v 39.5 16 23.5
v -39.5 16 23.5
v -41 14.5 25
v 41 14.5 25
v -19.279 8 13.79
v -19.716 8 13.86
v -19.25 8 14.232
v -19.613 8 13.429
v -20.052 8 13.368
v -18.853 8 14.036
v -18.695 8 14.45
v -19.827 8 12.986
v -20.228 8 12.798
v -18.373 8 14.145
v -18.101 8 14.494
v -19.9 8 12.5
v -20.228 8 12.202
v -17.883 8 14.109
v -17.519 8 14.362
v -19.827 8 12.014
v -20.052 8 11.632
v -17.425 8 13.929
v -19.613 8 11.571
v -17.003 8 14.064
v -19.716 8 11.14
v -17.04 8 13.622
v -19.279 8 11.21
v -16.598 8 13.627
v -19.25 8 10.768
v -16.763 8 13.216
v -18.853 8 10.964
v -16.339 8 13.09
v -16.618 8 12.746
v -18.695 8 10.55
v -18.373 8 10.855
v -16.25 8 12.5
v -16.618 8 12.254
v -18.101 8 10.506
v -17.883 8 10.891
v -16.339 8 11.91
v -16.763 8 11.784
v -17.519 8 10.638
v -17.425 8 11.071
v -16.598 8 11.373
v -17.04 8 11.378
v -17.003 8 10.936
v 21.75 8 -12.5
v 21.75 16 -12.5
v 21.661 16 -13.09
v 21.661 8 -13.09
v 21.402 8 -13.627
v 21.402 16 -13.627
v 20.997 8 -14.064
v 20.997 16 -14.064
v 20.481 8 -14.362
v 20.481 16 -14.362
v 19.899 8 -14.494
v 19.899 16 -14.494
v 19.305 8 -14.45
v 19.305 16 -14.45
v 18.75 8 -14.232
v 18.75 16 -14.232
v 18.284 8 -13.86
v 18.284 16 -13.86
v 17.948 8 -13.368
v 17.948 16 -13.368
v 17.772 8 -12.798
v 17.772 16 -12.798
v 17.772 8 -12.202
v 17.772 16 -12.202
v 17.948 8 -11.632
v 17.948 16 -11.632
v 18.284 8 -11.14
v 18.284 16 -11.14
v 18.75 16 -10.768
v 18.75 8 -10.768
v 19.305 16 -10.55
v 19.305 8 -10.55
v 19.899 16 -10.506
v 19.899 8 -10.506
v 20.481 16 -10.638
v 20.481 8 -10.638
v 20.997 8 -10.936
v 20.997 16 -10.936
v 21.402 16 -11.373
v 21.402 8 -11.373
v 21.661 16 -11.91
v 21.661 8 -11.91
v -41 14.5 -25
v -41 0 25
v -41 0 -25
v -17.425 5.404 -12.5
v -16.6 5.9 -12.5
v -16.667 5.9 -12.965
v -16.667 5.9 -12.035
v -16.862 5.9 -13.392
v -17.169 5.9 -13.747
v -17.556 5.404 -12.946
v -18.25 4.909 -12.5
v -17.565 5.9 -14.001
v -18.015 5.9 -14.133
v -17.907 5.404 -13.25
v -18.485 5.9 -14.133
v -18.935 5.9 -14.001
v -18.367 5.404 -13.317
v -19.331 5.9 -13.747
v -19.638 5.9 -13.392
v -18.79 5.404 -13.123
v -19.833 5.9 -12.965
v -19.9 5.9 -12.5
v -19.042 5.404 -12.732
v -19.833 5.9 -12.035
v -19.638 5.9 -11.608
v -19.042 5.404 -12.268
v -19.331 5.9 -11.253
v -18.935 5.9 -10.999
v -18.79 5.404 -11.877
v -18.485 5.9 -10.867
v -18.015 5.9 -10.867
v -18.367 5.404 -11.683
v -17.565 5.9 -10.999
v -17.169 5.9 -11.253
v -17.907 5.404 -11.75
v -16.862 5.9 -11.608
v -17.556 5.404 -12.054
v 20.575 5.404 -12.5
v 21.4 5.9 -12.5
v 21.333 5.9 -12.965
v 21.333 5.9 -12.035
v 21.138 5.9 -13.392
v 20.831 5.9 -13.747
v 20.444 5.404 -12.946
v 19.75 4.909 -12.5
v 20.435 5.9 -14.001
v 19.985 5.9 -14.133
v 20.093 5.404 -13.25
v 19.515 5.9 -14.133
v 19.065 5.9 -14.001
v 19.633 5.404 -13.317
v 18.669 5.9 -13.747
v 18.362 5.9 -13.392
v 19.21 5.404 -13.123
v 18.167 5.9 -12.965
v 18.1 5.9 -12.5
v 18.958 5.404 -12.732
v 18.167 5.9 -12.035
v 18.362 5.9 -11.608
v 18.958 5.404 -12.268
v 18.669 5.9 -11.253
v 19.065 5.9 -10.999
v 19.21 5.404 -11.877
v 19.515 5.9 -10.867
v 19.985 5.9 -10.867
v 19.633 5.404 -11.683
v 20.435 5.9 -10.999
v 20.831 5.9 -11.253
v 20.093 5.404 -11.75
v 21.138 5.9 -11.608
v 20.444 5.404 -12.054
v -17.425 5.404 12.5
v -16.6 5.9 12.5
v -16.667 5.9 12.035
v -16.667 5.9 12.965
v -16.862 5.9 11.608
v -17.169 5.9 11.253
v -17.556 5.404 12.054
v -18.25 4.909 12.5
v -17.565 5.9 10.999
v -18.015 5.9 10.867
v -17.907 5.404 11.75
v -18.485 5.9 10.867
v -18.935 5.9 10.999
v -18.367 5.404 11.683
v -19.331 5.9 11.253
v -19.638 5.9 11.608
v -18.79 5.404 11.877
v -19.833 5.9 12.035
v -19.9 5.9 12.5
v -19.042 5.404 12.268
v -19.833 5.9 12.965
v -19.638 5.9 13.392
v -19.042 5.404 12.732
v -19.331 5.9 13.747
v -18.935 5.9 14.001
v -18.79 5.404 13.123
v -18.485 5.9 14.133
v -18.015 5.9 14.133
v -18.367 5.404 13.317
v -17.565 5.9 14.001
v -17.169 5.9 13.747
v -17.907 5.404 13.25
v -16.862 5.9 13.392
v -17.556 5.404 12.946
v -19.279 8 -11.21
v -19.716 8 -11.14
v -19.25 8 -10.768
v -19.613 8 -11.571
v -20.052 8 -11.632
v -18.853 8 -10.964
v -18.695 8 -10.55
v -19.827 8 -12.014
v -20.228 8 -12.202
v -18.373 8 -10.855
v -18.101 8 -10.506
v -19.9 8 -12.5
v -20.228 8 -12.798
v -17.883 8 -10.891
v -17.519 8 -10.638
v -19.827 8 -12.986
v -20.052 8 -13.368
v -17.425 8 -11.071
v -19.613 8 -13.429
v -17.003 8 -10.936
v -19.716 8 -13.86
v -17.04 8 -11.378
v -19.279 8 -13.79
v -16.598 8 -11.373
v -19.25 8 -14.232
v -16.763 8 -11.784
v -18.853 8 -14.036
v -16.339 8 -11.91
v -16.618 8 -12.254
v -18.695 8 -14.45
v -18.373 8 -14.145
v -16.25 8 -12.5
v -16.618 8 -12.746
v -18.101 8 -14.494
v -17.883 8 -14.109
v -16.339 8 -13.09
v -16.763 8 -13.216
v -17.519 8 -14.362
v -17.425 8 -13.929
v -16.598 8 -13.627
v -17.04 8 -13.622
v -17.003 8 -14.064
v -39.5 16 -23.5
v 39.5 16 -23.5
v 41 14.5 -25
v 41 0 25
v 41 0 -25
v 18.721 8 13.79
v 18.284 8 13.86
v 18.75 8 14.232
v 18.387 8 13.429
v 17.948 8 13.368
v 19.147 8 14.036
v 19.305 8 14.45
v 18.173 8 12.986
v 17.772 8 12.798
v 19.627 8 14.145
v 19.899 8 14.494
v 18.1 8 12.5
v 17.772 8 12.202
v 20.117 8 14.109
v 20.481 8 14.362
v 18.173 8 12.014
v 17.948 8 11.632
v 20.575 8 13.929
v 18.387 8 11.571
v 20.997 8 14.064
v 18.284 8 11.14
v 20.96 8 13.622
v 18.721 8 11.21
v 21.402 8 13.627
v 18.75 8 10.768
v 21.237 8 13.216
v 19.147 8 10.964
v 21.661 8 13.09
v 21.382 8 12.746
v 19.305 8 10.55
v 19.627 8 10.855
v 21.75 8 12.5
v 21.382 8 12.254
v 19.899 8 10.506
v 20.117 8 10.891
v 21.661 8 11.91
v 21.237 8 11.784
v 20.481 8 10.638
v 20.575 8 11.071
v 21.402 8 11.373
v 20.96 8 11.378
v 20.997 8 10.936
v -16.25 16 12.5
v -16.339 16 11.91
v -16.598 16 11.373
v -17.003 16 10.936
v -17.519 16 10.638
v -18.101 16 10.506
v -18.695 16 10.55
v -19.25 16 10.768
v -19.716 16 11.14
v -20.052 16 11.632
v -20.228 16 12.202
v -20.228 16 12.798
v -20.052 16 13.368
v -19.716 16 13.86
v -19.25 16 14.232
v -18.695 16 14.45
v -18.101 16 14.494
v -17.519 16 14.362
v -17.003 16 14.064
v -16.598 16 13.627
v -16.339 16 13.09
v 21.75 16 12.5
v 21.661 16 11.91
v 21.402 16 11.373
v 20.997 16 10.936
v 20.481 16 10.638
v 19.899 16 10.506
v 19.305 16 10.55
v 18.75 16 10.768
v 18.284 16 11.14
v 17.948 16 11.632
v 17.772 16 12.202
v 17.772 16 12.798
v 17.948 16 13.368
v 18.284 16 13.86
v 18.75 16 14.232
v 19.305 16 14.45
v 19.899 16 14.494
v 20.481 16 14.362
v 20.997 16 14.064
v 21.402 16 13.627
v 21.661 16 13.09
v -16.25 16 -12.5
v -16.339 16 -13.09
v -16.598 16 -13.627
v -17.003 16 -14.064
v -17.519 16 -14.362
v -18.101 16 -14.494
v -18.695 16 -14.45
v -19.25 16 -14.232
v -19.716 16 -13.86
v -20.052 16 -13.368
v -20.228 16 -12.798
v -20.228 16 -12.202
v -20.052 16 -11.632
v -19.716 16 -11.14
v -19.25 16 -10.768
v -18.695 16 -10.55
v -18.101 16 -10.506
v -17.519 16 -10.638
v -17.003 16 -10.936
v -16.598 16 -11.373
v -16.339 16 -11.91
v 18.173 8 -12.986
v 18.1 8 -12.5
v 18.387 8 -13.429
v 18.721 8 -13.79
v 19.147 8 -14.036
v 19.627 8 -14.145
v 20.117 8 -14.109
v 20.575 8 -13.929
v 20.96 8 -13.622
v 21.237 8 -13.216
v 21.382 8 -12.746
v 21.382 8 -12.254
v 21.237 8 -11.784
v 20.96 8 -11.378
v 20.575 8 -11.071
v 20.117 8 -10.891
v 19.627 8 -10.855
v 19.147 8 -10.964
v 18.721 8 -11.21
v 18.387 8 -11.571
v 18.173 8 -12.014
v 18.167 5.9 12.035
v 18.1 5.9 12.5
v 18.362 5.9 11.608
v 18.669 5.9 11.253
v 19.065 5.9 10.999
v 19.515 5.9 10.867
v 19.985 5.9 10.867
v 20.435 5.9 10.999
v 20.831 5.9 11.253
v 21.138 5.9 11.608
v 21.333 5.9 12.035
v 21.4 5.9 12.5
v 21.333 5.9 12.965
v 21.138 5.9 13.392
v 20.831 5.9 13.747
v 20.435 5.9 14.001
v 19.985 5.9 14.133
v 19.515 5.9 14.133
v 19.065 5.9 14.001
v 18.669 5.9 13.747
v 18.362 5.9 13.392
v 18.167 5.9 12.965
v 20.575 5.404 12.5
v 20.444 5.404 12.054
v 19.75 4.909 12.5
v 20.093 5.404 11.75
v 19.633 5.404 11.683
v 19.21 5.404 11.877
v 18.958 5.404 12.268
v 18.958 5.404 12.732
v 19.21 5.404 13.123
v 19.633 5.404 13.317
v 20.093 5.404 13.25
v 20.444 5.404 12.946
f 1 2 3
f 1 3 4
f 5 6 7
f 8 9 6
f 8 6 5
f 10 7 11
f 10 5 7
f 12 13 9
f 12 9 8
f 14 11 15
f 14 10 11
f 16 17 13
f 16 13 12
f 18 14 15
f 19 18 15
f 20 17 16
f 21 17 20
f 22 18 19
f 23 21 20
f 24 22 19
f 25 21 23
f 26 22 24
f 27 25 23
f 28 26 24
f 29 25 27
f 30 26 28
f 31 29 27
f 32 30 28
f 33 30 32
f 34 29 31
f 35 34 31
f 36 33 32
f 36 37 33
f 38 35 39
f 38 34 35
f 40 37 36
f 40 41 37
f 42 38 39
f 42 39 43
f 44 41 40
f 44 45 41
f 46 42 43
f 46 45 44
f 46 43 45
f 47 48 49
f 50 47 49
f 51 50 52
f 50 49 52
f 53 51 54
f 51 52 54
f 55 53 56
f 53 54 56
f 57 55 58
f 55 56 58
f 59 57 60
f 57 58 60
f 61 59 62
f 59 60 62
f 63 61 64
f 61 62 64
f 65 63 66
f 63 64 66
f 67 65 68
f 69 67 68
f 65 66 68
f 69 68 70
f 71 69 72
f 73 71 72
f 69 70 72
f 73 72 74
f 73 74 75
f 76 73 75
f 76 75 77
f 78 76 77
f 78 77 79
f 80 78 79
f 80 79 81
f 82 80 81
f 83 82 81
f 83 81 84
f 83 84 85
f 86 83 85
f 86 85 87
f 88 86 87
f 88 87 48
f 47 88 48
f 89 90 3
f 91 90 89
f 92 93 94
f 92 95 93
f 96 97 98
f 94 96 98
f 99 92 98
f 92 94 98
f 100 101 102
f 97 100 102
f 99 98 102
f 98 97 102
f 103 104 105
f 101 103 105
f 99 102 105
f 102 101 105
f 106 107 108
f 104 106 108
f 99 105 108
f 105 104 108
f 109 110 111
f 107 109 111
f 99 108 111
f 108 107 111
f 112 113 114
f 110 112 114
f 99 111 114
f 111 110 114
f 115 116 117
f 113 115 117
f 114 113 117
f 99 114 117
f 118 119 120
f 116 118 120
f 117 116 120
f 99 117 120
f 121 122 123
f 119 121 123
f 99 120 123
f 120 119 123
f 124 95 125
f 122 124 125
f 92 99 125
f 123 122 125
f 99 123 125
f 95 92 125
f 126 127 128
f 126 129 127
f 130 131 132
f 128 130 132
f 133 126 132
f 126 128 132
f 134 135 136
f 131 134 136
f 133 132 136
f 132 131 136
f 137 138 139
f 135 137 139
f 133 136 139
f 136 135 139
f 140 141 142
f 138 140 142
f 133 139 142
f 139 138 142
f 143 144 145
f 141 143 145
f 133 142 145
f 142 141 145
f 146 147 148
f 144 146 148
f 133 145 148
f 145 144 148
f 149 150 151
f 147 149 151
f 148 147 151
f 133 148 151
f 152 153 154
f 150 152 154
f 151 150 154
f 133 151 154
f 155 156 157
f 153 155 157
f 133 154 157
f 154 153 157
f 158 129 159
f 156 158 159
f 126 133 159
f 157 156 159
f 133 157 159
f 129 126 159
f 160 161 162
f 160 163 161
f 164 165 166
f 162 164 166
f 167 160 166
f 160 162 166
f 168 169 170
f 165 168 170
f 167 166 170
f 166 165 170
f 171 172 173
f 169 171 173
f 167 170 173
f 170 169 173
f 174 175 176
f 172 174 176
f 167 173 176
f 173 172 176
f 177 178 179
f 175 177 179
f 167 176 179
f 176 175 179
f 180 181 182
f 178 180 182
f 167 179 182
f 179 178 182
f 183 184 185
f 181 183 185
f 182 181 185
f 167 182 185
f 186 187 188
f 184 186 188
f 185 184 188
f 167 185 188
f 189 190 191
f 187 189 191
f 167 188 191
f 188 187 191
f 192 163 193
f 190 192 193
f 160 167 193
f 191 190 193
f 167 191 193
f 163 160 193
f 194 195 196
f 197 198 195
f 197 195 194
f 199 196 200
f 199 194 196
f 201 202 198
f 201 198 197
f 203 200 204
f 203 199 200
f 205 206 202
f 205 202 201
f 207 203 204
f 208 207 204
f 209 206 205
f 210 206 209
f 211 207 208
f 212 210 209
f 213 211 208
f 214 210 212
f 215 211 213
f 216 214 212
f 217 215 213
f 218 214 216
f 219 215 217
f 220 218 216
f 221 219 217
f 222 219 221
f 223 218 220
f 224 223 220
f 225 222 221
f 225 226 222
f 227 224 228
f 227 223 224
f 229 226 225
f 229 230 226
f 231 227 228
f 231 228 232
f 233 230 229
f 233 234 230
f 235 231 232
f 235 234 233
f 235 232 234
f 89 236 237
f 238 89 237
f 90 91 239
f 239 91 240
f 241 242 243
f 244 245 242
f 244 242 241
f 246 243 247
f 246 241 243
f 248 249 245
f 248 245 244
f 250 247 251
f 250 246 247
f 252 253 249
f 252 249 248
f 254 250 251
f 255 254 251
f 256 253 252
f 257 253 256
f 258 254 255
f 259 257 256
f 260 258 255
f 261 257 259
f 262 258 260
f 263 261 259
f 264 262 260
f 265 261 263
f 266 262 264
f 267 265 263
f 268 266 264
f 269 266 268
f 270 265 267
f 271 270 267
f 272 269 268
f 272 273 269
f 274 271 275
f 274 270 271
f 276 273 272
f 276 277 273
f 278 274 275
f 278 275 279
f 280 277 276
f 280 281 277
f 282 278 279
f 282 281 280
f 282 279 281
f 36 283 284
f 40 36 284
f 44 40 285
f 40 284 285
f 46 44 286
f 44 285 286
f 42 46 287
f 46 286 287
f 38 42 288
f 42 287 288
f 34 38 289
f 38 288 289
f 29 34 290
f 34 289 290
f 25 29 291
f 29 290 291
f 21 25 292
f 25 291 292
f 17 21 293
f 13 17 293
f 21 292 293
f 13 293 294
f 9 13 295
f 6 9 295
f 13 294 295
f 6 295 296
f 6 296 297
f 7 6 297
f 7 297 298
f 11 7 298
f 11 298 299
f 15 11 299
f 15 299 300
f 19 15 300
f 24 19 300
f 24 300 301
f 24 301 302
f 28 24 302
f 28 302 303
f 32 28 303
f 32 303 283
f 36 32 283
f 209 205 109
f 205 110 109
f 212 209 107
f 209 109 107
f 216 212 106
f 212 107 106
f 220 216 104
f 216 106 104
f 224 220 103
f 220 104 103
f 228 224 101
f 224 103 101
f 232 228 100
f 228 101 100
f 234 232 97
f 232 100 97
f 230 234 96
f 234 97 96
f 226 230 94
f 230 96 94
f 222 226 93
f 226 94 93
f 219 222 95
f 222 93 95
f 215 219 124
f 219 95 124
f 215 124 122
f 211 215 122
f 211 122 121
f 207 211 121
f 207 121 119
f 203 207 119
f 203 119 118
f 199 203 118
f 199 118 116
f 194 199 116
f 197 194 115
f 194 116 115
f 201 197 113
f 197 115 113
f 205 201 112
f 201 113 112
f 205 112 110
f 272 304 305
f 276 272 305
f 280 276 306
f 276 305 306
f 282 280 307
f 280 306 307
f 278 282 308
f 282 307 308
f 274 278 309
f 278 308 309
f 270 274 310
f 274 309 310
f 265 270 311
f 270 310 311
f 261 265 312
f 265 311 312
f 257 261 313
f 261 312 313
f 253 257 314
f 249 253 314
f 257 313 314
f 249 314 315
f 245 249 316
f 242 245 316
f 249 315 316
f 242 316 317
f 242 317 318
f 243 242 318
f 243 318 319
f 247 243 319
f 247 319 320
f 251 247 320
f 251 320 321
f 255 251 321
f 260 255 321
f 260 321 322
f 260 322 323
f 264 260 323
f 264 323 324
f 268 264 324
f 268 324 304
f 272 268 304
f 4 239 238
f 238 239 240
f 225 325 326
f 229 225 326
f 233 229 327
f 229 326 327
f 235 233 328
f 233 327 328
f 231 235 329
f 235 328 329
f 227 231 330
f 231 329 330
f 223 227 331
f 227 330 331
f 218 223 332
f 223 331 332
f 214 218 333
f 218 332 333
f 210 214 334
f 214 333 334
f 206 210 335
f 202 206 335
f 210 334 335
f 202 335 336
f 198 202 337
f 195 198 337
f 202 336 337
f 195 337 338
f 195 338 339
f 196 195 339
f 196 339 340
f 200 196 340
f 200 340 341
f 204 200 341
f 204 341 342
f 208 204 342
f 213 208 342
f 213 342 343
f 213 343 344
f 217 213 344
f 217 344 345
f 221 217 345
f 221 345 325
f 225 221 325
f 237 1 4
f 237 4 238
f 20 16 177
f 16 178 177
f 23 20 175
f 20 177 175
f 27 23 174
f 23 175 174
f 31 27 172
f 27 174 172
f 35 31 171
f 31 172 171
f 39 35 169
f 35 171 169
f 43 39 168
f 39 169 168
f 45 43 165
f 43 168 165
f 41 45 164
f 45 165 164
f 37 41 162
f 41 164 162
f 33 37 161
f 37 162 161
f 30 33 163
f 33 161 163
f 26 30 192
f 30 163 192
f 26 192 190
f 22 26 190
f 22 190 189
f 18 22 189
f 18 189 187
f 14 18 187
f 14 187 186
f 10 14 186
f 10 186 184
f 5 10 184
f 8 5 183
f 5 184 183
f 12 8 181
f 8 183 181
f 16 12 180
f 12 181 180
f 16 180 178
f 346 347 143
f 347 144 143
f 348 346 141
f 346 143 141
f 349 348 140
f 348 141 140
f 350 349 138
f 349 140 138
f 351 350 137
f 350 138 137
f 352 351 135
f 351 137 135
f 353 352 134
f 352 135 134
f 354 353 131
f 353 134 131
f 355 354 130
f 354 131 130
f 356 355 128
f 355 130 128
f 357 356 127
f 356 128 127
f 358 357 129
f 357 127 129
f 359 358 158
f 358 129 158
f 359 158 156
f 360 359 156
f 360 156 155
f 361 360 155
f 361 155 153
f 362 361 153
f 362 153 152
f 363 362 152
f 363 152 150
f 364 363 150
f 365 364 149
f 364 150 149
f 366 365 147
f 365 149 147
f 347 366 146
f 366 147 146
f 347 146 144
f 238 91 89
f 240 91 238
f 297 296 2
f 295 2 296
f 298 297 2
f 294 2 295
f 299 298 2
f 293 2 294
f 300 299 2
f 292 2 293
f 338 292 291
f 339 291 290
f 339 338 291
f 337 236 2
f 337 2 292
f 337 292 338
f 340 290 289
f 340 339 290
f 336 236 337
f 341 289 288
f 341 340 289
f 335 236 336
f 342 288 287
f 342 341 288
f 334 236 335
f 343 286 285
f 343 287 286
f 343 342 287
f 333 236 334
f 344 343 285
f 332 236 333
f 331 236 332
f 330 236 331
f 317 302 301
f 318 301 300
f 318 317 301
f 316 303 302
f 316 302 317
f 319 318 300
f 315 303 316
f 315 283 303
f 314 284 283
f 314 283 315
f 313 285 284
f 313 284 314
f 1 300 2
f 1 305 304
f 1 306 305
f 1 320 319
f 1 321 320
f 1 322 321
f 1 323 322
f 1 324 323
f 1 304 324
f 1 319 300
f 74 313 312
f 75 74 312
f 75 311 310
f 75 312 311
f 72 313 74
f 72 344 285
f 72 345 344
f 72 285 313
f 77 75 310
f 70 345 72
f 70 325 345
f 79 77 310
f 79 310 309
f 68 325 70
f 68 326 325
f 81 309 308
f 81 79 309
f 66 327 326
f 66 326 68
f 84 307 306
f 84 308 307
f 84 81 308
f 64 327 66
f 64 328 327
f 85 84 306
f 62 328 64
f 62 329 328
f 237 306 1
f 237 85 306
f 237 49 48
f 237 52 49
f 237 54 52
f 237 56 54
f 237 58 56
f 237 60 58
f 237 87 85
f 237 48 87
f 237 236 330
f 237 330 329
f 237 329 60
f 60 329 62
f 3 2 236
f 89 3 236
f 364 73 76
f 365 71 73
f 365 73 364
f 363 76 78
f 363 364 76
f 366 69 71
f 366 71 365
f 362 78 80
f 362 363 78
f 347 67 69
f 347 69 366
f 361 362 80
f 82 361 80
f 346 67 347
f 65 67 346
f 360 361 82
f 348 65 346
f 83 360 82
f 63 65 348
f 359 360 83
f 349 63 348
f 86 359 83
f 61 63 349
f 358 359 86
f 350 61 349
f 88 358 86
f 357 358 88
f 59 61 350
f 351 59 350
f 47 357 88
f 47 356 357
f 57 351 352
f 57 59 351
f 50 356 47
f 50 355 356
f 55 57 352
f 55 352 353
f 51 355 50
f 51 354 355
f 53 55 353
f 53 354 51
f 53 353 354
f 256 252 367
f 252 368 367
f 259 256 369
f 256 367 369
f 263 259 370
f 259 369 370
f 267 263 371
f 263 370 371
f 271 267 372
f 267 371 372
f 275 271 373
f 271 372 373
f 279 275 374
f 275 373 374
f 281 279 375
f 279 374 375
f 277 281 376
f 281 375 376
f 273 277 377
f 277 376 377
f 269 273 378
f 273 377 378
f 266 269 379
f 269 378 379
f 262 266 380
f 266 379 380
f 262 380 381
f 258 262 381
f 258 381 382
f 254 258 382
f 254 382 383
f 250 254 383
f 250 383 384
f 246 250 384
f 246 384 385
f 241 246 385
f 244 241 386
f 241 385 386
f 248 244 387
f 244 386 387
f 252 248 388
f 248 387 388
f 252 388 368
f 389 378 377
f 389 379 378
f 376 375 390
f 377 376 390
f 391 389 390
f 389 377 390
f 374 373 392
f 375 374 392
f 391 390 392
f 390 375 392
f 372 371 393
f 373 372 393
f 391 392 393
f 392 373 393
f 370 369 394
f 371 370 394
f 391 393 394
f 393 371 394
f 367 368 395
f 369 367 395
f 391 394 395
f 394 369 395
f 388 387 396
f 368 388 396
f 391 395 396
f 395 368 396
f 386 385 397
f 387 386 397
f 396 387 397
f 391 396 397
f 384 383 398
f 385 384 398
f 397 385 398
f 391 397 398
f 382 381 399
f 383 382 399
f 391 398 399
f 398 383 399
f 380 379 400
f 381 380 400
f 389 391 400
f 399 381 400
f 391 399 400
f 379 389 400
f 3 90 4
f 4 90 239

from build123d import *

# Parameters (mm, degrees)
SKETCH1_W                   = 82
SKETCH1_H                   = 50
BOSS_EXTRUDE1_DEPTH         = 16
CHAMFER1_SIZE               = 1.5
M4_TAPPED_HOLE3_D           = 3.3
M4_TAPPED_HOLE3_DEPTH       = 10.1
M4_TAPPED_HOLE3_CBORE_D     = 4
M4_TAPPED_HOLE3_CBORE_DEPTH = 8
M4_TAPPED_HOLE3_TIP         = 0.991420021


with BuildPart() as part:
    # Sketch1 → Boss-Extrude1 (new body)
    with BuildSketch(Plane(origin=(0, 0, 0), x_dir=(1, 0, 0), z_dir=(0, 1, 0))):
        Rectangle(SKETCH1_W, SKETCH1_H)
    extrude(amount=BOSS_EXTRUDE1_DEPTH)

    # Chamfer1
    chamfer1_edges = [part.edges().sort_by_distance(p)[0] for p in [
        (41, 16, 0),
        (0, 16, -25),
        (-41, 16, 0),
        (0, 16, 25),
    ]]
    chamfer(chamfer1_edges, length=CHAMFER1_SIZE)

    # M4 Tapped Hole3
    with Locations(Plane(origin=(0, 16, 0), x_dir=(1, 0, 0), z_dir=(0, 1, 0))):
        with Locations((-18.25, -12.5), (19.75, 12.5), (-18.25, 12.5), (19.75, -12.5)):
            CounterBoreHole(M4_TAPPED_HOLE3_D / 2, M4_TAPPED_HOLE3_CBORE_D / 2, M4_TAPPED_HOLE3_CBORE_DEPTH, depth=M4_TAPPED_HOLE3_DEPTH)
            with Locations((0, 0, -(M4_TAPPED_HOLE3_DEPTH + M4_TAPPED_HOLE3_TIP / 2))):  # 118° drill point
                Cone(0, M4_TAPPED_HOLE3_D / 2, M4_TAPPED_HOLE3_TIP, mode=Mode.SUBTRACT)


solid = part.part
